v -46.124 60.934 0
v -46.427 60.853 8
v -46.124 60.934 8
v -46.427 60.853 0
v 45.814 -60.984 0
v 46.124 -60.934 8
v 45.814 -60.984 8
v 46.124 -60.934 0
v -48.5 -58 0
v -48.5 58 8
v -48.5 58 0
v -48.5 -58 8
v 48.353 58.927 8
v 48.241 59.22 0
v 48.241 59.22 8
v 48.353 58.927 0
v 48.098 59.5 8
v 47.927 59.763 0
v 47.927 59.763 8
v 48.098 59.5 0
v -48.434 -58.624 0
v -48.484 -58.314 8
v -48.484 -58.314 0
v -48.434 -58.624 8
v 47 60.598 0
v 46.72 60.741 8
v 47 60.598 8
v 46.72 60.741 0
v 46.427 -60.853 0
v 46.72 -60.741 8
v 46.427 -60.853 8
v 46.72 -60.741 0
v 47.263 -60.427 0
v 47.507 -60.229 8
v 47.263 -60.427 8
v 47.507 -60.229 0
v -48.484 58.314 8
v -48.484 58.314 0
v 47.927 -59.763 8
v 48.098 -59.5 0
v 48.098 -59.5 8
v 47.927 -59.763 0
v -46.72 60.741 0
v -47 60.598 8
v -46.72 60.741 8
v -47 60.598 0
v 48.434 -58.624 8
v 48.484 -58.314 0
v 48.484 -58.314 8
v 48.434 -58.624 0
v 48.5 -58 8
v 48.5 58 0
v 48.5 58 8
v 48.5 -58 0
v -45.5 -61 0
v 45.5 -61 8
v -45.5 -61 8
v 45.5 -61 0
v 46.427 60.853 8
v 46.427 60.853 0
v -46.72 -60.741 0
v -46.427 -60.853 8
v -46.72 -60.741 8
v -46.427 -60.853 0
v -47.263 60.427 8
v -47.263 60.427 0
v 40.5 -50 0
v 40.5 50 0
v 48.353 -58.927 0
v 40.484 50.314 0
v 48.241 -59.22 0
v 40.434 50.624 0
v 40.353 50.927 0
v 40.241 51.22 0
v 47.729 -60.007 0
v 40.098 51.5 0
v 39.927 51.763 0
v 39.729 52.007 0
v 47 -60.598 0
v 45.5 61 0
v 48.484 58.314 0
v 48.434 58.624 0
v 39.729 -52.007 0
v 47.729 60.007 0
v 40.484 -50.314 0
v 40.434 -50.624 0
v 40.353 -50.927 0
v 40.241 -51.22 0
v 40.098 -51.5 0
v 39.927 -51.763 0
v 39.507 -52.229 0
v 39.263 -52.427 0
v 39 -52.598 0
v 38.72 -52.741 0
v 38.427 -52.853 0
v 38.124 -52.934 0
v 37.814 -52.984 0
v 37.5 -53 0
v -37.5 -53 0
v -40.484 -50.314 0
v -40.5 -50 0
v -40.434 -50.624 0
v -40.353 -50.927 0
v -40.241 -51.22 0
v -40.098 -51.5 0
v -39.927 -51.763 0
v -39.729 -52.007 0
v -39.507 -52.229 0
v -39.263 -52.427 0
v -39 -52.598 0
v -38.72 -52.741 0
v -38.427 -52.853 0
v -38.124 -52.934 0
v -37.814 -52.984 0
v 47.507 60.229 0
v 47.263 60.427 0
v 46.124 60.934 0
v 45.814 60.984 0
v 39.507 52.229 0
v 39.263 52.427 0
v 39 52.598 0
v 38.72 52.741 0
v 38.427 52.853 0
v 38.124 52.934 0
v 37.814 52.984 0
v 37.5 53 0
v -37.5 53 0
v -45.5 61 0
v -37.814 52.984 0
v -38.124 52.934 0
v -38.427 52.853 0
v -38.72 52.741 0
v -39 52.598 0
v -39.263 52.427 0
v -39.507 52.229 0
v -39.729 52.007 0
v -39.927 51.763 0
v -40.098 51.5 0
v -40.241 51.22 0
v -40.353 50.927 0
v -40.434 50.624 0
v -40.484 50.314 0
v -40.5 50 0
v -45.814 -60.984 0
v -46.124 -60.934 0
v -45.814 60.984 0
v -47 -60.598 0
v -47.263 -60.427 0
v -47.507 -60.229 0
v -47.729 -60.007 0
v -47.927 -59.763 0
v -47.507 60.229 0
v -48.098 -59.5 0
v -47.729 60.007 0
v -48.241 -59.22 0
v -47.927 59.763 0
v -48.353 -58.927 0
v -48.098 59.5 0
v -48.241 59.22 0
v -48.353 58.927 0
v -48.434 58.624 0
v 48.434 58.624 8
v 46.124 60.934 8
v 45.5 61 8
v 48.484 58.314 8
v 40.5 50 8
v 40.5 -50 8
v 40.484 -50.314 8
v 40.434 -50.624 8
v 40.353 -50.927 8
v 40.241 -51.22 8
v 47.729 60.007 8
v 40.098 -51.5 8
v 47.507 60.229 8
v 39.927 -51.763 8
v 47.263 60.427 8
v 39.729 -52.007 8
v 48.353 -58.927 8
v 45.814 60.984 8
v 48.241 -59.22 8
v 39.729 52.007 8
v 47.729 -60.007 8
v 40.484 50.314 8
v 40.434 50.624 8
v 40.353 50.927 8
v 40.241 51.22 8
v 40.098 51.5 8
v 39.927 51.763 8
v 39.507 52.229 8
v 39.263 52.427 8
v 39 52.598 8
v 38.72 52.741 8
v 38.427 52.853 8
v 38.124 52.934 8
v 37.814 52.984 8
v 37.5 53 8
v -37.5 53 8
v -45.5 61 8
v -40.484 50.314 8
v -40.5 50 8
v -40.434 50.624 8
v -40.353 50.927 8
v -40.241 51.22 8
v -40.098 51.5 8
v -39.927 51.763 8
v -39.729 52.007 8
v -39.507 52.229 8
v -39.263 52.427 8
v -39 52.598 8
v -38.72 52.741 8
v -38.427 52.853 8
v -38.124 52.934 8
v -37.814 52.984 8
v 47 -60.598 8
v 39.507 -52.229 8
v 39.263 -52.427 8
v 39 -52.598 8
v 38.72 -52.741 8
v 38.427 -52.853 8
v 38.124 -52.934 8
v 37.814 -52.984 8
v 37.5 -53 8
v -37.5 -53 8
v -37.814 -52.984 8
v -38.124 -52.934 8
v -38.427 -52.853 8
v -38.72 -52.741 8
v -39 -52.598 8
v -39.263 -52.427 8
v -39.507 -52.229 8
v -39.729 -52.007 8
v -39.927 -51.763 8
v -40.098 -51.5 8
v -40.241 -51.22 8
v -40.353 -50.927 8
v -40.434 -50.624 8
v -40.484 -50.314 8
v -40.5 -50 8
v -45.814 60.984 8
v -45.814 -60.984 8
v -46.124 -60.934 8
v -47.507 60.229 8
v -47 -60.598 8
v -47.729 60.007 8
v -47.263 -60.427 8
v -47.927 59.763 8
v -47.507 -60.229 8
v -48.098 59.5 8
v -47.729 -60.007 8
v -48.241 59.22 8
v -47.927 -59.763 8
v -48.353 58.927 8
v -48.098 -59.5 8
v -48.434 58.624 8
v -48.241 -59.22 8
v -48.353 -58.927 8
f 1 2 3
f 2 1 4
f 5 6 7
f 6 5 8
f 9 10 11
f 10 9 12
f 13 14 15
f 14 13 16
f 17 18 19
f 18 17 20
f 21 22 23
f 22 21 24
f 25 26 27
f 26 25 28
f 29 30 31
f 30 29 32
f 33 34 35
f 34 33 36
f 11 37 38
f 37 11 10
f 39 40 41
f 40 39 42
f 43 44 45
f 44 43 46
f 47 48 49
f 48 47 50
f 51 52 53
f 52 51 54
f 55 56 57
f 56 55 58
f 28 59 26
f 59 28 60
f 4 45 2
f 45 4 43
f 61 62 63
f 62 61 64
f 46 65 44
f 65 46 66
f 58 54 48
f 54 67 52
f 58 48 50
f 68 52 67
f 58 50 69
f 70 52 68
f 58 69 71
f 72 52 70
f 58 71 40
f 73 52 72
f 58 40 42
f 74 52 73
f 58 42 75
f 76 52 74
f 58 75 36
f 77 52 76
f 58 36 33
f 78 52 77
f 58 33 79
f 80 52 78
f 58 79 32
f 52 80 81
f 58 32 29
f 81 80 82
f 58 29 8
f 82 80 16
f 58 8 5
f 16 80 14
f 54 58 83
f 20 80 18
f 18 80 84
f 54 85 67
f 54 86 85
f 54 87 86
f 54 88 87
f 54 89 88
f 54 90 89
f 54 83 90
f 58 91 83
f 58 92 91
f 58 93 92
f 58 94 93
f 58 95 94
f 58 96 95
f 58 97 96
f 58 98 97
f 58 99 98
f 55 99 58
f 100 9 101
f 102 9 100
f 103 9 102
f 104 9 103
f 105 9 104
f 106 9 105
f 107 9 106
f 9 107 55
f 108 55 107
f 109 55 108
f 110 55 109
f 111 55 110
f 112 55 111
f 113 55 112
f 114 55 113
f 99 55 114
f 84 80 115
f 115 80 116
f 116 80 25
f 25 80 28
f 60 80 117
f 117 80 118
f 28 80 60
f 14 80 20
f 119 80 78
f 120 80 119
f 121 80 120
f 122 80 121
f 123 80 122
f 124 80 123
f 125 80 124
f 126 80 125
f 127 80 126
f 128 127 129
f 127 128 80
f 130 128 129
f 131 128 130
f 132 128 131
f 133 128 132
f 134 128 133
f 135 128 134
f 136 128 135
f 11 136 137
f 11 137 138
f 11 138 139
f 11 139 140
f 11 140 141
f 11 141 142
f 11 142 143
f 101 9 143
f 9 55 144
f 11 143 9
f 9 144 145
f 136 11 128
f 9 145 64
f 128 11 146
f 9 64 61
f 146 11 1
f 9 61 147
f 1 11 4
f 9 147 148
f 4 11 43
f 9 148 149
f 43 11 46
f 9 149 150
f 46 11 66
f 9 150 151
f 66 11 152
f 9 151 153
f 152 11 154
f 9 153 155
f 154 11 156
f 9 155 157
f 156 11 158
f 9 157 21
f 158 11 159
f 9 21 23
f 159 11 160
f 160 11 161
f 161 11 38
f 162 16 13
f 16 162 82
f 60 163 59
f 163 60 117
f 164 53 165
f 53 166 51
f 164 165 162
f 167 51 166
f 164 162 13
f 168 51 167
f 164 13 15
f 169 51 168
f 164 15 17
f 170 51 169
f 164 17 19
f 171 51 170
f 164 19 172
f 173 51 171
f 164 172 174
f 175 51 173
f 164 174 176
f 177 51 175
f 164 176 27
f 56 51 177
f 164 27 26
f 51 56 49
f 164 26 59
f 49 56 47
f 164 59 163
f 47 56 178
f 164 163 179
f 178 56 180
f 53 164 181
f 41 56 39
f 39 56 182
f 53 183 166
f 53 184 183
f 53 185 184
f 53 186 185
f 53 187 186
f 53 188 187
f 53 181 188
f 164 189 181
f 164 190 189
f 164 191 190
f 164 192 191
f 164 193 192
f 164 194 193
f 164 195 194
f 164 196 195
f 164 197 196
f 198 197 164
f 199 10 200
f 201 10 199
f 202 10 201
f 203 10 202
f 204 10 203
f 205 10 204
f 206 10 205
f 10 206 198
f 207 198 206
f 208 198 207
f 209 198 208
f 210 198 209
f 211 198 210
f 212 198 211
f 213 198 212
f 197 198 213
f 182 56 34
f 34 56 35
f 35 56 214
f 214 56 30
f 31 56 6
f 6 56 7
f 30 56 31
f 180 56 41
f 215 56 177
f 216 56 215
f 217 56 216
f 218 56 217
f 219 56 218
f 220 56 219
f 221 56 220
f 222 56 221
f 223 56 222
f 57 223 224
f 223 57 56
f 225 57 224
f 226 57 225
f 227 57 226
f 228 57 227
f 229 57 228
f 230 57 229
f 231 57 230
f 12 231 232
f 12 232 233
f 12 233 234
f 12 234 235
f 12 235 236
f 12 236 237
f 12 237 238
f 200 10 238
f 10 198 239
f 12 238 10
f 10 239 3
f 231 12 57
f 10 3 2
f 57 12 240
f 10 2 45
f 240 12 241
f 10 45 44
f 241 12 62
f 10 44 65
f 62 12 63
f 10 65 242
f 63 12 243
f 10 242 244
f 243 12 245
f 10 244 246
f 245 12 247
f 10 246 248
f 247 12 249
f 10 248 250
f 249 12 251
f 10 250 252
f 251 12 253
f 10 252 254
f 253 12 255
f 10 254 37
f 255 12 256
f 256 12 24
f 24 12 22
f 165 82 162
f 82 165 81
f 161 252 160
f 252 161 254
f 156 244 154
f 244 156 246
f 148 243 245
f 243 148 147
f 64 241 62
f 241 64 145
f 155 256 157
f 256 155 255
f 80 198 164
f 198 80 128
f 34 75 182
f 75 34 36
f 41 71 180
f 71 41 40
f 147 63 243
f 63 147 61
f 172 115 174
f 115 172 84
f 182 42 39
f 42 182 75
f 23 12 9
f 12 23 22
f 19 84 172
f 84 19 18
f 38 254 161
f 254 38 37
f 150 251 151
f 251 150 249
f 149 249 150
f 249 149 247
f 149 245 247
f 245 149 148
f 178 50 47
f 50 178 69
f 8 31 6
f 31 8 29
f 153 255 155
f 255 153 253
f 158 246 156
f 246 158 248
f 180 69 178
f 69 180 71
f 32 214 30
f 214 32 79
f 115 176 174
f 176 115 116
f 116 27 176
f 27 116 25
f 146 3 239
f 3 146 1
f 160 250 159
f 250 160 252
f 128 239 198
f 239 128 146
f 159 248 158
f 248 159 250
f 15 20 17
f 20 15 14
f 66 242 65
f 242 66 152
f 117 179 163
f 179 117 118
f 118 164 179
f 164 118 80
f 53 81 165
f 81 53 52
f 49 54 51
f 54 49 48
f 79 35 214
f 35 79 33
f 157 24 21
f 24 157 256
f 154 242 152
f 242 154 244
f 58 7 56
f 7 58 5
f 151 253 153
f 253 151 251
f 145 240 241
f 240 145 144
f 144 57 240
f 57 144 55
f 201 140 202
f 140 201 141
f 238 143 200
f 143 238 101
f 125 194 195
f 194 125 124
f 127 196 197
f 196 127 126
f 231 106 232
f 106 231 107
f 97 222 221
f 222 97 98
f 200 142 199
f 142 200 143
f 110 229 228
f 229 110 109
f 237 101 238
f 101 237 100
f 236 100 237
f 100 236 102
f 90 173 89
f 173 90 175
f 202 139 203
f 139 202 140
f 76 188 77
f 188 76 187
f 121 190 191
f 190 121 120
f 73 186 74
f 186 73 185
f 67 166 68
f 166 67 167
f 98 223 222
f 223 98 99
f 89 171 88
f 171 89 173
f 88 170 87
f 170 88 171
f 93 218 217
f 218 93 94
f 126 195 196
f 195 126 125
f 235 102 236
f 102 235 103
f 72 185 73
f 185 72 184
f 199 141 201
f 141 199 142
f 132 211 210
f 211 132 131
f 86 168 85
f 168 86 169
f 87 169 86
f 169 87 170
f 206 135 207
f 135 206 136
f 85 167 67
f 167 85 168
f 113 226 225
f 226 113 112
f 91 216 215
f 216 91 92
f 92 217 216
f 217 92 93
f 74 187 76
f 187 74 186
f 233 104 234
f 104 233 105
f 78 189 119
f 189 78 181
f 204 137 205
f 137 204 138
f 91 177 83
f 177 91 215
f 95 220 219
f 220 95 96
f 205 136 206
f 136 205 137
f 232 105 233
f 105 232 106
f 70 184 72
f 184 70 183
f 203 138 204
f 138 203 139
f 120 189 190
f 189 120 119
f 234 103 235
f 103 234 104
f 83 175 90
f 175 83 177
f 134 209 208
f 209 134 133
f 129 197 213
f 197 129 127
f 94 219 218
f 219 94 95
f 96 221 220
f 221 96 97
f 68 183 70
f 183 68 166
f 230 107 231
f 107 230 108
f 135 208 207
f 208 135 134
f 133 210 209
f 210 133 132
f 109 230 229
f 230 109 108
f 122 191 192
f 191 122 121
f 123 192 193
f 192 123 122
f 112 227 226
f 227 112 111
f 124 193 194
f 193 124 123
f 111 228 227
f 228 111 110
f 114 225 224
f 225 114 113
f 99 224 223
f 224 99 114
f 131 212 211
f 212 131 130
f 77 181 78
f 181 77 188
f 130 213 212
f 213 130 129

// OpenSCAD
dep=81; /* measured 80.3 */
wid=43; /* measured 42.3 */
thk=8;  /* measured 3.5 */
spc=20; /* est. for typical 1kg spool */
rad=3;  /* est. from model */

outsideWid=8;

$fn=60;

difference() {
   outside();
   inside();
}

module inside() {
   hull() {
      translate([-dep/2+rad, -wid+rad-spc/2,-1]) cylinder(r=3,h=thk+2);
      translate([dep/2-rad, -wid+rad-spc/2,-1]) cylinder(r=3,h=thk+2);
      translate([dep/2-rad, wid-rad+spc/2,-1]) cylinder(r=3,h=thk+2);
      translate([-dep/2+rad, wid-rad+spc/2,-1]) cylinder(r=3,h=thk+2);
   }
}

module outside() {
   hull() {
      translate([-dep/2+rad-outsideWid, -wid+rad-spc/2-outsideWid,0])
         cylinder(r=3,h=thk);
      translate([dep/2-rad+outsideWid, -wid+rad-spc/2-outsideWid,0])
         cylinder(r=3,h=thk);
      translate([dep/2-rad+outsideWid, wid-rad+spc/2+outsideWid,0])
         cylinder(r=3,h=thk);
      translate([-dep/2+rad-outsideWid, wid-rad+spc/2+outsideWid,0])
         cylinder(r=3,h=thk);
   }
}
